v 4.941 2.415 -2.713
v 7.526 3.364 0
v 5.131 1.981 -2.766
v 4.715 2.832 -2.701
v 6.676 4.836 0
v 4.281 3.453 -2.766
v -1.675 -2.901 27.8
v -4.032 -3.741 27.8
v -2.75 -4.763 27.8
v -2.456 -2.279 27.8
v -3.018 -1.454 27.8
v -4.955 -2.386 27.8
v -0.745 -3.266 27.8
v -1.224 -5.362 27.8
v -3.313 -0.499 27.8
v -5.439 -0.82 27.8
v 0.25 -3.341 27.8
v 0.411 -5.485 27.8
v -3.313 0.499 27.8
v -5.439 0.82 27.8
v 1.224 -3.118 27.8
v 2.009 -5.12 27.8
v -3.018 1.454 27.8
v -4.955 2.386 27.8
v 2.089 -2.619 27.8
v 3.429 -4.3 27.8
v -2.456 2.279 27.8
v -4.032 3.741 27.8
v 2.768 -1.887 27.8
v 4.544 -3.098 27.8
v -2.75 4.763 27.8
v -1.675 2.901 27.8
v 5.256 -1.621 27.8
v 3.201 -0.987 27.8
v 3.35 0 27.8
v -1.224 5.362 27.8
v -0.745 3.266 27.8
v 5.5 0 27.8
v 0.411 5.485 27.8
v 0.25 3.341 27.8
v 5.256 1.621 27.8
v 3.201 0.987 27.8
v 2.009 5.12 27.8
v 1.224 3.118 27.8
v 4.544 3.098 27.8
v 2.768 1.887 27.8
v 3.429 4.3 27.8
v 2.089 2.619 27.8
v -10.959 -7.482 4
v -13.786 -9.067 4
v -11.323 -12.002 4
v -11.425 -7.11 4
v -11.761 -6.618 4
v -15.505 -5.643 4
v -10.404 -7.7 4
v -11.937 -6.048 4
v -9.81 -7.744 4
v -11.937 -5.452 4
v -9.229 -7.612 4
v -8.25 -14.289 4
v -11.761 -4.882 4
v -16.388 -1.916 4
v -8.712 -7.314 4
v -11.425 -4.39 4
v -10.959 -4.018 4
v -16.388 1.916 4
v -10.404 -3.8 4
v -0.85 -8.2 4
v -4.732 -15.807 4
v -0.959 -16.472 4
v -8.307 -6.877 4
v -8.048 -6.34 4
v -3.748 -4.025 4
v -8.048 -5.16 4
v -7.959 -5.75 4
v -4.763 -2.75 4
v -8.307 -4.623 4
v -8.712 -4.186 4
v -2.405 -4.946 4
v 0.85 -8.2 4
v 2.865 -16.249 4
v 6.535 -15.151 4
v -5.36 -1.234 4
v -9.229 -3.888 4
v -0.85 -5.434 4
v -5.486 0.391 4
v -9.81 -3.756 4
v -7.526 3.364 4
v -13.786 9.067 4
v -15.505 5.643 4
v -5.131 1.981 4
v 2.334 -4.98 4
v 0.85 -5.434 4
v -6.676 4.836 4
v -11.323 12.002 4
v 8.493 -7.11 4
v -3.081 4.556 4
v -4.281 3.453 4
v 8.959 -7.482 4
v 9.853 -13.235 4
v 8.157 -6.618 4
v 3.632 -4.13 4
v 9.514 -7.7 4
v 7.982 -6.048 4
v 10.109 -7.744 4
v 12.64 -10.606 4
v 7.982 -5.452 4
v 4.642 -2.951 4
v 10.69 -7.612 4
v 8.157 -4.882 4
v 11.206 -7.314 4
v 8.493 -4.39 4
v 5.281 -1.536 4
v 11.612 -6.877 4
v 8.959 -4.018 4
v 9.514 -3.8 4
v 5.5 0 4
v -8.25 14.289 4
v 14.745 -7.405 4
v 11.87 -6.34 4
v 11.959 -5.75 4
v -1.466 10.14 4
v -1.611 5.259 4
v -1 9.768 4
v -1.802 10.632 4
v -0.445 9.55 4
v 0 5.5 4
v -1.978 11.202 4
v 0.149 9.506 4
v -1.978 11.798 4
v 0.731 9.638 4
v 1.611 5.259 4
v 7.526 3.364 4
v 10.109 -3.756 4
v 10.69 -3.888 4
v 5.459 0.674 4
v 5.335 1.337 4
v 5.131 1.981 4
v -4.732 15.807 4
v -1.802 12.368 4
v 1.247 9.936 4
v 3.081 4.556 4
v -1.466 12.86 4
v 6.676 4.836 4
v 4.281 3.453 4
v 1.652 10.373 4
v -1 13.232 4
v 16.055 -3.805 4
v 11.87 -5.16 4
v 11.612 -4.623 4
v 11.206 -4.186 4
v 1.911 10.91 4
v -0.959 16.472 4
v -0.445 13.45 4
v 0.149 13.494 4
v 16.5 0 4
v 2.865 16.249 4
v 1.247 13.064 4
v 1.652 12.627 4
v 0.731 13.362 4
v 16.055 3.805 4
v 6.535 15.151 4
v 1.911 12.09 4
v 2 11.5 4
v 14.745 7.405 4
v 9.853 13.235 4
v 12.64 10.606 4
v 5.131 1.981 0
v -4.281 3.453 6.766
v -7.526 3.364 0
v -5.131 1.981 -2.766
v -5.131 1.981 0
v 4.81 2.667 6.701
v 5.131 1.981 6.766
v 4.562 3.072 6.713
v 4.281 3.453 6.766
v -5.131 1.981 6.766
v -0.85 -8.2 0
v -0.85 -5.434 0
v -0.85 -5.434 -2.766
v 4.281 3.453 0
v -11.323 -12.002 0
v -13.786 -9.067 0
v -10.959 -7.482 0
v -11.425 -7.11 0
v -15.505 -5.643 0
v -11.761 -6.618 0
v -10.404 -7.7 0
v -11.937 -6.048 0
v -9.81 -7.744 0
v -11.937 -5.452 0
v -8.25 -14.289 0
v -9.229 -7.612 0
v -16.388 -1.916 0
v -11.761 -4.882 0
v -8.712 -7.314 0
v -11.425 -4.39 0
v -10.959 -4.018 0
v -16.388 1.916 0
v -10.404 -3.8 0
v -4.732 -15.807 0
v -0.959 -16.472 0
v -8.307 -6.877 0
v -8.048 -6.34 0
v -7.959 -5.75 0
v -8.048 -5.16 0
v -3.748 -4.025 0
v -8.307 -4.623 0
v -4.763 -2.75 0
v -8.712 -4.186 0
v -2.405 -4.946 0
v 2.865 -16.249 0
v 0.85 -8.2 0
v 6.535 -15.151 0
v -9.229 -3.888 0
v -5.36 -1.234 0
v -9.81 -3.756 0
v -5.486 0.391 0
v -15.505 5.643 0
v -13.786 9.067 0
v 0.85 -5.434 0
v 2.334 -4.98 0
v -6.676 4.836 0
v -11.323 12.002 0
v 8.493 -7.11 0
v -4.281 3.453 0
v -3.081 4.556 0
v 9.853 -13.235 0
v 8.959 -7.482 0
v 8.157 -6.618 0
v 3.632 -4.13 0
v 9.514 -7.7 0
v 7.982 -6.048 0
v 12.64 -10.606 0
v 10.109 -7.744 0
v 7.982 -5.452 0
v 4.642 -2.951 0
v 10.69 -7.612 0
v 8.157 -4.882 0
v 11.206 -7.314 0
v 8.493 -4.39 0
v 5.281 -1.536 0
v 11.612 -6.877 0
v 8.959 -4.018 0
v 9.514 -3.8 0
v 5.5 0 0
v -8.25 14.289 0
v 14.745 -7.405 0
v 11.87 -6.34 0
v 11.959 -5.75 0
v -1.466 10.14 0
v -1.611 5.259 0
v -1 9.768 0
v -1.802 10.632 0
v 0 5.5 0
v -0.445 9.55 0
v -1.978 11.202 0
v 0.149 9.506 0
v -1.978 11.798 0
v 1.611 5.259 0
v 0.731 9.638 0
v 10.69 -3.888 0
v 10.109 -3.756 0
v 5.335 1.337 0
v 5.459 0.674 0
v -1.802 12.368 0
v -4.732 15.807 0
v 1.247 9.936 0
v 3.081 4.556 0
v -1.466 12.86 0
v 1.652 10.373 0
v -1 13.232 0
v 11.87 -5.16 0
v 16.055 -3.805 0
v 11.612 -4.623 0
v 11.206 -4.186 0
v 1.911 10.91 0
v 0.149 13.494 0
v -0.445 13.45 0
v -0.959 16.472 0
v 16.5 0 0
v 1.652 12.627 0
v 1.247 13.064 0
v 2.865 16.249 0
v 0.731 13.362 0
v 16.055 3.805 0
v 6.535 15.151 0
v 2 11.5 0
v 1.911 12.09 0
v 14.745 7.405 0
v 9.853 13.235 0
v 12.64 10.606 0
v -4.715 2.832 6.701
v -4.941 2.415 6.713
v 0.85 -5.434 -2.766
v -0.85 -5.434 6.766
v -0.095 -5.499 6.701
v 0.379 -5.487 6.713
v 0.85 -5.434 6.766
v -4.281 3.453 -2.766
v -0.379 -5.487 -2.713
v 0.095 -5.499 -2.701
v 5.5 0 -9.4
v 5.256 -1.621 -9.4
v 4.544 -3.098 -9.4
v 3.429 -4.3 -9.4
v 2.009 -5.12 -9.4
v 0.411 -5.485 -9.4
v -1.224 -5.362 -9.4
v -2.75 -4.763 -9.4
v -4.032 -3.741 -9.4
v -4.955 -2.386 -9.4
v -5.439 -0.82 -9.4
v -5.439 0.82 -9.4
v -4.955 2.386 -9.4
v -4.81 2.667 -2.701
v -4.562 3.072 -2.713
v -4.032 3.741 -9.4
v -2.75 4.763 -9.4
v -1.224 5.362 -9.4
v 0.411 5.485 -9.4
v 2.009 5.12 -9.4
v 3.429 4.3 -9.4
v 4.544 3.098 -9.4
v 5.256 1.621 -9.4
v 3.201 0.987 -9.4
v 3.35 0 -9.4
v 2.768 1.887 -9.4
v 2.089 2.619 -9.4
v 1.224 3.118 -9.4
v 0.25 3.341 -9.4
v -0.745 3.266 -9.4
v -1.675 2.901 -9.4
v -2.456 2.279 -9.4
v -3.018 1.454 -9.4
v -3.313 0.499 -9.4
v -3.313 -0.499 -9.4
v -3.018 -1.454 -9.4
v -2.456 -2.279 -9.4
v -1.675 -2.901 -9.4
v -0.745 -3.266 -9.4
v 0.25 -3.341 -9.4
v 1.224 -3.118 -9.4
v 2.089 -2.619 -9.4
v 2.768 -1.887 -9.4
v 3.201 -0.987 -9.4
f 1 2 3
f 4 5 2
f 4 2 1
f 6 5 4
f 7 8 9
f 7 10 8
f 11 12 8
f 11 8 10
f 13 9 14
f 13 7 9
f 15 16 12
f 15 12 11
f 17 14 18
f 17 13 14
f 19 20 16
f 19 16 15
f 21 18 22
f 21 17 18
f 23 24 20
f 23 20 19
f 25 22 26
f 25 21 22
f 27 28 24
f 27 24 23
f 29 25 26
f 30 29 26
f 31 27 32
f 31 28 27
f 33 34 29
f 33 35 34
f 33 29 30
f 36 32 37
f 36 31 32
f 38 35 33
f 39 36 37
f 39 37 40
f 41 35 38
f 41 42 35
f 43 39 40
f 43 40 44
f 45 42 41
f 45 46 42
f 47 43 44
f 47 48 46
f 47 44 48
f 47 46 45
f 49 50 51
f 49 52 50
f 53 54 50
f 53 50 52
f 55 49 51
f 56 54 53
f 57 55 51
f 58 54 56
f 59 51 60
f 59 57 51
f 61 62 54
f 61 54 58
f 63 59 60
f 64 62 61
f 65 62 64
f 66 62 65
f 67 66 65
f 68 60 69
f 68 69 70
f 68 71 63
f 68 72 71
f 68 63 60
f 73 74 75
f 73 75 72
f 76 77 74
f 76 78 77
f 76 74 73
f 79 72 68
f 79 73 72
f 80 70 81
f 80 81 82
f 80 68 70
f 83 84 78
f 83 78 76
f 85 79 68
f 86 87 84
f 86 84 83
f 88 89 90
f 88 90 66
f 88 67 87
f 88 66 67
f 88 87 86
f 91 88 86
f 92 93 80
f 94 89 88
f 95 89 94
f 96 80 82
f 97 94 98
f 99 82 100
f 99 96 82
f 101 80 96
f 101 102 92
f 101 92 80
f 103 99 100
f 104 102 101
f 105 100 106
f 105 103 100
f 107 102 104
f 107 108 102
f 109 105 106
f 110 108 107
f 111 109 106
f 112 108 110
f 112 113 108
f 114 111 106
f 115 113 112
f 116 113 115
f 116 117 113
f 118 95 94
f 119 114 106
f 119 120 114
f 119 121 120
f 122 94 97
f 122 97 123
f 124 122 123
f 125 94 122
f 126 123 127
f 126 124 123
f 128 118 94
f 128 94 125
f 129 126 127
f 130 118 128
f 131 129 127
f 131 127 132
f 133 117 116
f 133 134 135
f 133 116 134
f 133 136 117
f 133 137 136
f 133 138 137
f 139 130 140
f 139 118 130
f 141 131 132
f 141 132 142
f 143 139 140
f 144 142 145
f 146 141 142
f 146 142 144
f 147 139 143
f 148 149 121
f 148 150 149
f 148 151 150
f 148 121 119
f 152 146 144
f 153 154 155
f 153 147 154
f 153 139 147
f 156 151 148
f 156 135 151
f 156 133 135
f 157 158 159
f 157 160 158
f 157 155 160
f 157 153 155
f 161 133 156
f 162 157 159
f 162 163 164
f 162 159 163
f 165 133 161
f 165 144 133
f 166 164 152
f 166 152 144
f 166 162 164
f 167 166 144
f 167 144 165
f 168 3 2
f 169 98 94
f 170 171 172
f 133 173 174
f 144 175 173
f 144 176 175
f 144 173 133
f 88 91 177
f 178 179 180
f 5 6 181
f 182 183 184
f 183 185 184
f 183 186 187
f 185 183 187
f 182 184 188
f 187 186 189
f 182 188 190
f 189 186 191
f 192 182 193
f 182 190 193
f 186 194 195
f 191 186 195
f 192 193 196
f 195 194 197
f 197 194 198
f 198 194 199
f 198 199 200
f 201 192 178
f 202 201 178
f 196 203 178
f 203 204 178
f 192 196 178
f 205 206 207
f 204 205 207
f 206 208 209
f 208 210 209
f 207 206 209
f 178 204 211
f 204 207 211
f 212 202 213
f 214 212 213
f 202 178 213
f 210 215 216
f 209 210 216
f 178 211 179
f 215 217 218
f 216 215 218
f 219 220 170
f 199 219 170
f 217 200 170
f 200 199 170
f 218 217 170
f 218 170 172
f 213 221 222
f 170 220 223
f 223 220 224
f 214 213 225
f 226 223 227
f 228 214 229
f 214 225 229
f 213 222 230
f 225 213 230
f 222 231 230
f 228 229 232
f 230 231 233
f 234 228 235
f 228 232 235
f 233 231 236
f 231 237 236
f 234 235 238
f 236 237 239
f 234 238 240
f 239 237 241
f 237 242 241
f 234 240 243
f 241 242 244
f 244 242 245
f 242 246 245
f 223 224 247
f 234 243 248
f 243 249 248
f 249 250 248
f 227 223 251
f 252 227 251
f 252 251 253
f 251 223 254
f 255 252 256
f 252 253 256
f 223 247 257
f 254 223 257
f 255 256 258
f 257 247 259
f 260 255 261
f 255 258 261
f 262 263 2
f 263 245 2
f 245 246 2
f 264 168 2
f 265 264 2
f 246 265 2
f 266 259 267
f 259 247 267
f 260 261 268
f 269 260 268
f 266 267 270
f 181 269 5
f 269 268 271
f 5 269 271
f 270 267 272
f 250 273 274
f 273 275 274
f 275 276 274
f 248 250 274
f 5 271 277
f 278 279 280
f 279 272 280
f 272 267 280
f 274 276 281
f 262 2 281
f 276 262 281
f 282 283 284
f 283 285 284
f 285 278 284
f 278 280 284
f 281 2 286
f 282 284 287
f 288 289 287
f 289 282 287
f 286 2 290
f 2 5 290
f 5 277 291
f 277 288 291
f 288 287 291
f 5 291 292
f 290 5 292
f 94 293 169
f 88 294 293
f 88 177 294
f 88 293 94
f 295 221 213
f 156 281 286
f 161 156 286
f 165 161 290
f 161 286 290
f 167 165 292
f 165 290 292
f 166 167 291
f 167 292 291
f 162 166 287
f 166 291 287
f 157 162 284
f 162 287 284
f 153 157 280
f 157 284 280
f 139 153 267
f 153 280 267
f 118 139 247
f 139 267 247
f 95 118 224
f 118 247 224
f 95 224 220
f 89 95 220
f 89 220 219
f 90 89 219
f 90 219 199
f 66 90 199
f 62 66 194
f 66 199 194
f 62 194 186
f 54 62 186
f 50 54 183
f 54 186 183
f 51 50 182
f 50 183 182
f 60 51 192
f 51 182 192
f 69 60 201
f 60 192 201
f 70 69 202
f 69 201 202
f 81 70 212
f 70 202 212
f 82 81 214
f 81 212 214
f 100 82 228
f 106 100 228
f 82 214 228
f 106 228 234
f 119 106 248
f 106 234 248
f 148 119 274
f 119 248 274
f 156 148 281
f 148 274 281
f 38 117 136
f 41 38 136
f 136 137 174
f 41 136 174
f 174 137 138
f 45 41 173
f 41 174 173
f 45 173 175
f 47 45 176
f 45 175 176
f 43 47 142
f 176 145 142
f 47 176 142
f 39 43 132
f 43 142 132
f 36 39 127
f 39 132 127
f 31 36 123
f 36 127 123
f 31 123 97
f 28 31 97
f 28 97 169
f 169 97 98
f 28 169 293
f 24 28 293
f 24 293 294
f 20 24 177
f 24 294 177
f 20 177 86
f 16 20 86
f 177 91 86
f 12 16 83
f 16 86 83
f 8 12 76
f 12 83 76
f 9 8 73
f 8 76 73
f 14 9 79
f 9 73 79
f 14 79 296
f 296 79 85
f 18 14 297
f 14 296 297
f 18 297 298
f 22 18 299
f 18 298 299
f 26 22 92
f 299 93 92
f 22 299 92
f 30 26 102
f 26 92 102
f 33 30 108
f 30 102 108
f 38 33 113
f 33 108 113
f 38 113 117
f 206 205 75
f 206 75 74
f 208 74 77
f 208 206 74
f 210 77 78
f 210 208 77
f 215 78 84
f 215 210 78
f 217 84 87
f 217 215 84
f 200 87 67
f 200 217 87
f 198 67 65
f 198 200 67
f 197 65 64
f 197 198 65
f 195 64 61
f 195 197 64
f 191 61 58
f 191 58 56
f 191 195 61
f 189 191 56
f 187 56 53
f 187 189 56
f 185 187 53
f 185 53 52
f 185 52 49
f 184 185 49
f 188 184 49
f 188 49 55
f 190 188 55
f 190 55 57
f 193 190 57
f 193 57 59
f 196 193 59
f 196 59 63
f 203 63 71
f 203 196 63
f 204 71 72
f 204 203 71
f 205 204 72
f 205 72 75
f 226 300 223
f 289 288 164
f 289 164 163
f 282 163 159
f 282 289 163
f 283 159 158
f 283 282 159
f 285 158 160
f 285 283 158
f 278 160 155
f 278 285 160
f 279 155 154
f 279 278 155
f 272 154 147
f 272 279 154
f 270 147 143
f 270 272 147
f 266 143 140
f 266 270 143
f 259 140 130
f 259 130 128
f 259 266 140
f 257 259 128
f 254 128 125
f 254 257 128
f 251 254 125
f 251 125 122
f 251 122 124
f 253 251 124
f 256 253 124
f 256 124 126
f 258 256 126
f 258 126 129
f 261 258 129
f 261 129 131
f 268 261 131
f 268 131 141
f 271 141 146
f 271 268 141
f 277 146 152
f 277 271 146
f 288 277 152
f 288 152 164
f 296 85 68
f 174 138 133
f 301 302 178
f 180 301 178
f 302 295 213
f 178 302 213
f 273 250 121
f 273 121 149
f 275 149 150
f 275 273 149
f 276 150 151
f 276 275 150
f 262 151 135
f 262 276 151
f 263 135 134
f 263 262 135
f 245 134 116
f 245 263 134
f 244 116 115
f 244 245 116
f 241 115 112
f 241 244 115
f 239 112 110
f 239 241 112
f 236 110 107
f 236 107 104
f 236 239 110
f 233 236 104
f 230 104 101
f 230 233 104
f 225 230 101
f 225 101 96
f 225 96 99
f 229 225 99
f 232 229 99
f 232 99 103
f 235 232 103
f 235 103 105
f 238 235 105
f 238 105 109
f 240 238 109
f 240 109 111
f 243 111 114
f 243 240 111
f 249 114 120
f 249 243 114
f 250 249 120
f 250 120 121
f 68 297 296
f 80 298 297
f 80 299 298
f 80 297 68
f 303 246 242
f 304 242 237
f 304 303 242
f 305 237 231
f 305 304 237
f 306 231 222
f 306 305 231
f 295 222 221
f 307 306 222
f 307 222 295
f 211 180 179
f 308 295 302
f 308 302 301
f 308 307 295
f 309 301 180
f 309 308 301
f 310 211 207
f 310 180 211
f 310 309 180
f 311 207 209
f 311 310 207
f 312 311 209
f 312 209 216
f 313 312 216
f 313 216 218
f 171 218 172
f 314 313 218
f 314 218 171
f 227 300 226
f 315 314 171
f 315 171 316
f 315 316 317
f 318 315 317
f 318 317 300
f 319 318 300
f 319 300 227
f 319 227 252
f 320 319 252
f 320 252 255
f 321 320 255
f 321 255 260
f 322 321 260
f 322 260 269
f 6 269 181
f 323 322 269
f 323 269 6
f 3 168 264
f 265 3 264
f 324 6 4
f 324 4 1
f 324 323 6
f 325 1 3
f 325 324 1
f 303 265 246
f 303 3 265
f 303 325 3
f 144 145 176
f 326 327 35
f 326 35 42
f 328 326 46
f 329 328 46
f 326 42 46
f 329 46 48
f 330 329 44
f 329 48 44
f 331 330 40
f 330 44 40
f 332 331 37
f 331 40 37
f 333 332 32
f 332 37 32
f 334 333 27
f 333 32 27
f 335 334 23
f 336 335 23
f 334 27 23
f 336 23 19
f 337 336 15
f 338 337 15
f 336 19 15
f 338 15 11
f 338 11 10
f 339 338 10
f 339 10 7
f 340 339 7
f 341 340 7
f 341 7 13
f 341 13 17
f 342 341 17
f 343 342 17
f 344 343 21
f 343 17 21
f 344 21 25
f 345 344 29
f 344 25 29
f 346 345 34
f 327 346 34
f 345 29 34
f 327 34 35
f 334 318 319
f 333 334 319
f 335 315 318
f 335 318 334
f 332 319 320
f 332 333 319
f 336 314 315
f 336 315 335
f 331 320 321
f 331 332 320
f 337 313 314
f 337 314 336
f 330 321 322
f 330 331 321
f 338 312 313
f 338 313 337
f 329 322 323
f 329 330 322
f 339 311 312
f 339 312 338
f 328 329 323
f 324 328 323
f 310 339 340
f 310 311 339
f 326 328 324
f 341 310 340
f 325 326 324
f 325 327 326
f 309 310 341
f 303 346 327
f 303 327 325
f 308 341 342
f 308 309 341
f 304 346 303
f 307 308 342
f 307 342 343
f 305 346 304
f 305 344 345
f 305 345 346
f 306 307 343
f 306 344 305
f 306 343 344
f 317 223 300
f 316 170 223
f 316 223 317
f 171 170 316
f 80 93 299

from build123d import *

# Parameters (mm, degrees)
CROQUIS1_R              = 16.5
CROQUIS1_R_2            = 2
SALIENTE_EXTRUIR1_DEPTH = 4
CROQUIS2_R              = 5.5
SALIENTE_EXTRUIR2_DEPTH = 23.8
SALIENTE_EXTRUIR3_START = 9.4
CROQUIS3_R              = 5.5
SALIENTE_EXTRUIR3_DEPTH = 9.4
CROQUIS5_R              = 3.35
CORTAR_EXTRUIR1_DEPTH   = 37.2
SALIENTE_EXTRUIR7_DEPTH = 0.85
MATRIZC1_COUNT          = 3
SIMETR_A1_COPY_1_DEPTH  = 0.85
SIMETR_A1_COPY_2_DEPTH  = 0.85


with BuildPart() as part:
    # Croquis1 → Saliente-Extruir1 (new body)
    with BuildSketch(Plane.XY):
        Circle(CROQUIS1_R)
        with Locations((0, 11.5)):
            Circle(CROQUIS1_R_2, mode=Mode.SUBTRACT)
        with Locations((-9.959292144, -5.75)):
            Circle(CROQUIS1_R_2, mode=Mode.SUBTRACT)
        with Locations((9.959292144, -5.75)):
            Circle(CROQUIS1_R_2, mode=Mode.SUBTRACT)
    extrude(amount=SALIENTE_EXTRUIR1_DEPTH)

    # Croquis2 → Saliente-Extruir2 (add)
    with BuildSketch(Plane.XY.offset(4)):
        Circle(CROQUIS2_R)
    extrude(amount=SALIENTE_EXTRUIR2_DEPTH)

    # Croquis3 → Saliente-Extruir3 (add)
    with BuildSketch(Plane(origin=(0, 0, 0), x_dir=(-1, 0, 0), z_dir=(0, 0, -1)).offset(SALIENTE_EXTRUIR3_START)):
        with Locations(Location((0, 0, 0), (0, 0, 180))):
            Circle(CROQUIS3_R)
    extrude(amount=-SALIENTE_EXTRUIR3_DEPTH)

    # Croquis5 → Cortar-Extruir1 (cut)
    with BuildSketch(Plane.XY.offset(27.8)):
        Circle(CROQUIS5_R)
    extrude(amount=-CORTAR_EXTRUIR1_DEPTH, mode=Mode.SUBTRACT)

    # Croquis7 → Saliente-Extruir7 (add, symmetric)
    with BuildSketch(Plane(origin=(0, 0, 0), x_dir=(0, 0, -1), z_dir=(1, 0, 0))):
        Polygon((-4, -4.874650825), (-4, -5.5), (-6.7, -5.5), (-7.325349175, -4.874650825), align=None)
        Polygon((-6.7, -5.5), (-4, -8.2), (-4, -5.5), align=None)
    saliente_extruir7 = extrude(amount=SALIENTE_EXTRUIR7_DEPTH, both=True)

    # MatrizC1: Saliente-Extruir7 ×3 about axis
    matrizc1_axis = Axis((0, 0, -18.875230868), (0, 0, 1))
    for i in range(1, MATRIZC1_COUNT):
        add(saliente_extruir7.rotate(matrizc1_axis, i * 360 / MATRIZC1_COUNT))

    # Simetría1: Saliente-Extruir7 across plane
    add(saliente_extruir7.mirror(Plane.XY.offset(2)))

    # Simetría1 copy 1 sketch → Simetría1 copy 1 (add, symmetric)
    with BuildSketch(Plane(origin=(0, 0, 4), x_dir=(0, 0, 1), z_dir=(-0.4999999999999998, 0.8660254037844387, 0))):
        Polygon((-4, 4.874650825), (-4, 5.5), (-6.7, 5.5), (-7.325349175, 4.874650825), align=None)
        Polygon((-6.7, 5.5), (-4, 8.2), (-4, 5.5), align=None)
    extrude(amount=SIMETR_A1_COPY_1_DEPTH, both=True)

    # Simetría1 copy 2 sketch → Simetría1 copy 2 (add, symmetric)
    with BuildSketch(Plane(origin=(0, 0, 4), x_dir=(0, 0, 1), z_dir=(-0.5000000000000004, -0.8660254037844384, 0))):
        Polygon((-4, 4.874650825), (-4, 5.5), (-6.7, 5.5), (-7.325349175, 4.874650825), align=None)
        Polygon((-6.7, 5.5), (-4, 8.2), (-4, 5.5), align=None)
    extrude(amount=SIMETR_A1_COPY_2_DEPTH, both=True)


solid = part.part
